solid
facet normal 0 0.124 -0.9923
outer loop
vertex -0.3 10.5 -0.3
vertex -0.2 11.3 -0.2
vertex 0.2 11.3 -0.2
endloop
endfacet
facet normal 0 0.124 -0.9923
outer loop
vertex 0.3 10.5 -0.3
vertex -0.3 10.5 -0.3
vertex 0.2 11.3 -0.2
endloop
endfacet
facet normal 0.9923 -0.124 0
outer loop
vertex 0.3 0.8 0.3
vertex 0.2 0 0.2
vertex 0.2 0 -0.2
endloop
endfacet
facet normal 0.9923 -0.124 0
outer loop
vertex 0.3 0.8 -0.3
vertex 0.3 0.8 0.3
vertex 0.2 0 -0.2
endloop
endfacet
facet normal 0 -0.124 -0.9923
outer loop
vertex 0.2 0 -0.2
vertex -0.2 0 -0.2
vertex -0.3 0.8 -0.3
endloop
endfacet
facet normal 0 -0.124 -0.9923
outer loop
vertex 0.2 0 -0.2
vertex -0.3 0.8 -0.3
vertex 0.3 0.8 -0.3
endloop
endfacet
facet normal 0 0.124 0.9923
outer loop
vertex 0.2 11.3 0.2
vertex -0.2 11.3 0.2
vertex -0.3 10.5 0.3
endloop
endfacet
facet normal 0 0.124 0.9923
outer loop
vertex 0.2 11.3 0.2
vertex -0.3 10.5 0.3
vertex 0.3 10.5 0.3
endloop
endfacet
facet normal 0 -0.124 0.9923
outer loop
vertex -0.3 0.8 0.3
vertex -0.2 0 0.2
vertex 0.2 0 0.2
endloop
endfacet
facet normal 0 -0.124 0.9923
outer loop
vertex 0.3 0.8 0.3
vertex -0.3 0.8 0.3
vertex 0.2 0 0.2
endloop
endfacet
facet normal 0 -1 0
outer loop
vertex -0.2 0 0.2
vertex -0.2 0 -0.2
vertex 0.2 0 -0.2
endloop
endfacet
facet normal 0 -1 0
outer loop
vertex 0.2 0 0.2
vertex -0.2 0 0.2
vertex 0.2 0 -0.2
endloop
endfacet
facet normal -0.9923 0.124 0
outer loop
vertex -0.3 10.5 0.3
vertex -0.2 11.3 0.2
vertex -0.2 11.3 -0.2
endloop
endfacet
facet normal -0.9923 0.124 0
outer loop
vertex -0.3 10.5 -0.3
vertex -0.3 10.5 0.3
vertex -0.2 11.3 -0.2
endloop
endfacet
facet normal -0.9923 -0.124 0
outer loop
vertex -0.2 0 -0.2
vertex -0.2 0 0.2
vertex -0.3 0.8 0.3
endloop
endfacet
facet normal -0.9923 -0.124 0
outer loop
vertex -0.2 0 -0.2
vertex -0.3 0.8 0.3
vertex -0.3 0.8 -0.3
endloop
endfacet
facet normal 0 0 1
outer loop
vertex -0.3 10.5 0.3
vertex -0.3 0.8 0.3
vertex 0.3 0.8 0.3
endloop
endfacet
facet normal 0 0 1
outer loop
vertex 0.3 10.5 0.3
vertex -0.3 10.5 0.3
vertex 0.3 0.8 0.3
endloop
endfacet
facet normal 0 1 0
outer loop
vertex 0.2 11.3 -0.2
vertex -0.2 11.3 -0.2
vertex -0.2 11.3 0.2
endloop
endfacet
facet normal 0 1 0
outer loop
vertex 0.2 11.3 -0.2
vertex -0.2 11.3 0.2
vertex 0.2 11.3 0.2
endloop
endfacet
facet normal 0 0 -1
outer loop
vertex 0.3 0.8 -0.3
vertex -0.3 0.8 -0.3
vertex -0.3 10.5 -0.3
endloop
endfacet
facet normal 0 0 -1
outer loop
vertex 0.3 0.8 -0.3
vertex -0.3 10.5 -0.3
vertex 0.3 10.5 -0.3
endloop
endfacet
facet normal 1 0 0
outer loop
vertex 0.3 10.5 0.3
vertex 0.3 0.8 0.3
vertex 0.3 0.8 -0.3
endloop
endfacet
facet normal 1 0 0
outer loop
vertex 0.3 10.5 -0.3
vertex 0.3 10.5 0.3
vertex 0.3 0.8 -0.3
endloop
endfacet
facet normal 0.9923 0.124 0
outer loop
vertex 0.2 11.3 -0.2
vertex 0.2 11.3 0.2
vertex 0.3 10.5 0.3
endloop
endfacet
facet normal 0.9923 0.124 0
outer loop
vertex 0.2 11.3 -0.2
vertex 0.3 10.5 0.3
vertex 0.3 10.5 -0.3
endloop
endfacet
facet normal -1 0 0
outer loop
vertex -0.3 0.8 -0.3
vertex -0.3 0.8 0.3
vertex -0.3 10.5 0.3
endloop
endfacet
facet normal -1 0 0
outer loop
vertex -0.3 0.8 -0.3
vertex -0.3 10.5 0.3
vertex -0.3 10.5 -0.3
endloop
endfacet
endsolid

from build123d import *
from OCP.BRepFilletAPI import BRepFilletAPI_MakeChamfer

# Parameters (mm, degrees)
SKETCH_1_W      = 0.6
SKETCH_1_H      = 0.6
EXTRUDE_1_DEPTH = 11.3
CHAMFER_1_SIZE  = 0.8
CHAMFER_1_SIZE2 = 0.1


with BuildPart() as part:
    # 스케치1 → 보스-돌출1 (new body)
    with BuildSketch(Plane(origin=(0, 0, 0), x_dir=(1, 0, 0), z_dir=(0, 1, 0))):
        Rectangle(SKETCH_1_W, SKETCH_1_H)
    extrude(amount=EXTRUDE_1_DEPTH)

    # 모따기1: one chamfer whose edges measure the first distance from different faces: ONE call of the kernel's chamfer builder (chamfer() names one face for all edges)
    chamfer_1_edges_1 = [part.edges().sort_by_distance(p)[0] for p in [
        (-0.3, 11.3, 0),
        (-0.3, 0, 0),
    ]]
    chamfer_1_side_1 = [part.faces().sort_by_distance(p)[0] for p in [
        (-0.3, 5.65, 0),
    ]]
    chamfer_1_edges_2 = [part.edges().sort_by_distance(p)[0] for p in [
        (0, 11.3, 0.3),
        (0, 0, 0.3),
    ]]
    chamfer_1_side_2 = [part.faces().sort_by_distance(p)[0] for p in [
        (0, 5.65, 0.3),
    ]]
    chamfer_1_edges_3 = [part.edges().sort_by_distance(p)[0] for p in [
        (0.3, 11.3, 0),
        (0.3, 0, 0),
    ]]
    chamfer_1_side_3 = [part.faces().sort_by_distance(p)[0] for p in [
        (0.3, 5.65, 0),
    ]]
    chamfer_1_edges_4 = [part.edges().sort_by_distance(p)[0] for p in [
        (0, 0, -0.3),
        (0, 11.3, -0.3),
    ]]
    chamfer_1_side_4 = [part.faces().sort_by_distance(p)[0] for p in [
        (0, 5.65, -0.3),
    ]]
    chamfer_1 = BRepFilletAPI_MakeChamfer(part.part.solid().wrapped)
    for e in chamfer_1_edges_1:
        chamfer_1.Add(CHAMFER_1_SIZE, CHAMFER_1_SIZE2, e.wrapped, chamfer_1_side_1[0].wrapped)  # the first distance lies on this face
    for e in chamfer_1_edges_2:
        chamfer_1.Add(CHAMFER_1_SIZE, CHAMFER_1_SIZE2, e.wrapped, chamfer_1_side_2[0].wrapped)  # the first distance lies on this face
    for e in chamfer_1_edges_3:
        chamfer_1.Add(CHAMFER_1_SIZE, CHAMFER_1_SIZE2, e.wrapped, chamfer_1_side_3[0].wrapped)  # the first distance lies on this face
    for e in chamfer_1_edges_4:
        chamfer_1.Add(CHAMFER_1_SIZE, CHAMFER_1_SIZE2, e.wrapped, chamfer_1_side_4[0].wrapped)  # the first distance lies on this face
    add(Compound.cast(chamfer_1.Shape()), mode=Mode.REPLACE)


solid = part.part
